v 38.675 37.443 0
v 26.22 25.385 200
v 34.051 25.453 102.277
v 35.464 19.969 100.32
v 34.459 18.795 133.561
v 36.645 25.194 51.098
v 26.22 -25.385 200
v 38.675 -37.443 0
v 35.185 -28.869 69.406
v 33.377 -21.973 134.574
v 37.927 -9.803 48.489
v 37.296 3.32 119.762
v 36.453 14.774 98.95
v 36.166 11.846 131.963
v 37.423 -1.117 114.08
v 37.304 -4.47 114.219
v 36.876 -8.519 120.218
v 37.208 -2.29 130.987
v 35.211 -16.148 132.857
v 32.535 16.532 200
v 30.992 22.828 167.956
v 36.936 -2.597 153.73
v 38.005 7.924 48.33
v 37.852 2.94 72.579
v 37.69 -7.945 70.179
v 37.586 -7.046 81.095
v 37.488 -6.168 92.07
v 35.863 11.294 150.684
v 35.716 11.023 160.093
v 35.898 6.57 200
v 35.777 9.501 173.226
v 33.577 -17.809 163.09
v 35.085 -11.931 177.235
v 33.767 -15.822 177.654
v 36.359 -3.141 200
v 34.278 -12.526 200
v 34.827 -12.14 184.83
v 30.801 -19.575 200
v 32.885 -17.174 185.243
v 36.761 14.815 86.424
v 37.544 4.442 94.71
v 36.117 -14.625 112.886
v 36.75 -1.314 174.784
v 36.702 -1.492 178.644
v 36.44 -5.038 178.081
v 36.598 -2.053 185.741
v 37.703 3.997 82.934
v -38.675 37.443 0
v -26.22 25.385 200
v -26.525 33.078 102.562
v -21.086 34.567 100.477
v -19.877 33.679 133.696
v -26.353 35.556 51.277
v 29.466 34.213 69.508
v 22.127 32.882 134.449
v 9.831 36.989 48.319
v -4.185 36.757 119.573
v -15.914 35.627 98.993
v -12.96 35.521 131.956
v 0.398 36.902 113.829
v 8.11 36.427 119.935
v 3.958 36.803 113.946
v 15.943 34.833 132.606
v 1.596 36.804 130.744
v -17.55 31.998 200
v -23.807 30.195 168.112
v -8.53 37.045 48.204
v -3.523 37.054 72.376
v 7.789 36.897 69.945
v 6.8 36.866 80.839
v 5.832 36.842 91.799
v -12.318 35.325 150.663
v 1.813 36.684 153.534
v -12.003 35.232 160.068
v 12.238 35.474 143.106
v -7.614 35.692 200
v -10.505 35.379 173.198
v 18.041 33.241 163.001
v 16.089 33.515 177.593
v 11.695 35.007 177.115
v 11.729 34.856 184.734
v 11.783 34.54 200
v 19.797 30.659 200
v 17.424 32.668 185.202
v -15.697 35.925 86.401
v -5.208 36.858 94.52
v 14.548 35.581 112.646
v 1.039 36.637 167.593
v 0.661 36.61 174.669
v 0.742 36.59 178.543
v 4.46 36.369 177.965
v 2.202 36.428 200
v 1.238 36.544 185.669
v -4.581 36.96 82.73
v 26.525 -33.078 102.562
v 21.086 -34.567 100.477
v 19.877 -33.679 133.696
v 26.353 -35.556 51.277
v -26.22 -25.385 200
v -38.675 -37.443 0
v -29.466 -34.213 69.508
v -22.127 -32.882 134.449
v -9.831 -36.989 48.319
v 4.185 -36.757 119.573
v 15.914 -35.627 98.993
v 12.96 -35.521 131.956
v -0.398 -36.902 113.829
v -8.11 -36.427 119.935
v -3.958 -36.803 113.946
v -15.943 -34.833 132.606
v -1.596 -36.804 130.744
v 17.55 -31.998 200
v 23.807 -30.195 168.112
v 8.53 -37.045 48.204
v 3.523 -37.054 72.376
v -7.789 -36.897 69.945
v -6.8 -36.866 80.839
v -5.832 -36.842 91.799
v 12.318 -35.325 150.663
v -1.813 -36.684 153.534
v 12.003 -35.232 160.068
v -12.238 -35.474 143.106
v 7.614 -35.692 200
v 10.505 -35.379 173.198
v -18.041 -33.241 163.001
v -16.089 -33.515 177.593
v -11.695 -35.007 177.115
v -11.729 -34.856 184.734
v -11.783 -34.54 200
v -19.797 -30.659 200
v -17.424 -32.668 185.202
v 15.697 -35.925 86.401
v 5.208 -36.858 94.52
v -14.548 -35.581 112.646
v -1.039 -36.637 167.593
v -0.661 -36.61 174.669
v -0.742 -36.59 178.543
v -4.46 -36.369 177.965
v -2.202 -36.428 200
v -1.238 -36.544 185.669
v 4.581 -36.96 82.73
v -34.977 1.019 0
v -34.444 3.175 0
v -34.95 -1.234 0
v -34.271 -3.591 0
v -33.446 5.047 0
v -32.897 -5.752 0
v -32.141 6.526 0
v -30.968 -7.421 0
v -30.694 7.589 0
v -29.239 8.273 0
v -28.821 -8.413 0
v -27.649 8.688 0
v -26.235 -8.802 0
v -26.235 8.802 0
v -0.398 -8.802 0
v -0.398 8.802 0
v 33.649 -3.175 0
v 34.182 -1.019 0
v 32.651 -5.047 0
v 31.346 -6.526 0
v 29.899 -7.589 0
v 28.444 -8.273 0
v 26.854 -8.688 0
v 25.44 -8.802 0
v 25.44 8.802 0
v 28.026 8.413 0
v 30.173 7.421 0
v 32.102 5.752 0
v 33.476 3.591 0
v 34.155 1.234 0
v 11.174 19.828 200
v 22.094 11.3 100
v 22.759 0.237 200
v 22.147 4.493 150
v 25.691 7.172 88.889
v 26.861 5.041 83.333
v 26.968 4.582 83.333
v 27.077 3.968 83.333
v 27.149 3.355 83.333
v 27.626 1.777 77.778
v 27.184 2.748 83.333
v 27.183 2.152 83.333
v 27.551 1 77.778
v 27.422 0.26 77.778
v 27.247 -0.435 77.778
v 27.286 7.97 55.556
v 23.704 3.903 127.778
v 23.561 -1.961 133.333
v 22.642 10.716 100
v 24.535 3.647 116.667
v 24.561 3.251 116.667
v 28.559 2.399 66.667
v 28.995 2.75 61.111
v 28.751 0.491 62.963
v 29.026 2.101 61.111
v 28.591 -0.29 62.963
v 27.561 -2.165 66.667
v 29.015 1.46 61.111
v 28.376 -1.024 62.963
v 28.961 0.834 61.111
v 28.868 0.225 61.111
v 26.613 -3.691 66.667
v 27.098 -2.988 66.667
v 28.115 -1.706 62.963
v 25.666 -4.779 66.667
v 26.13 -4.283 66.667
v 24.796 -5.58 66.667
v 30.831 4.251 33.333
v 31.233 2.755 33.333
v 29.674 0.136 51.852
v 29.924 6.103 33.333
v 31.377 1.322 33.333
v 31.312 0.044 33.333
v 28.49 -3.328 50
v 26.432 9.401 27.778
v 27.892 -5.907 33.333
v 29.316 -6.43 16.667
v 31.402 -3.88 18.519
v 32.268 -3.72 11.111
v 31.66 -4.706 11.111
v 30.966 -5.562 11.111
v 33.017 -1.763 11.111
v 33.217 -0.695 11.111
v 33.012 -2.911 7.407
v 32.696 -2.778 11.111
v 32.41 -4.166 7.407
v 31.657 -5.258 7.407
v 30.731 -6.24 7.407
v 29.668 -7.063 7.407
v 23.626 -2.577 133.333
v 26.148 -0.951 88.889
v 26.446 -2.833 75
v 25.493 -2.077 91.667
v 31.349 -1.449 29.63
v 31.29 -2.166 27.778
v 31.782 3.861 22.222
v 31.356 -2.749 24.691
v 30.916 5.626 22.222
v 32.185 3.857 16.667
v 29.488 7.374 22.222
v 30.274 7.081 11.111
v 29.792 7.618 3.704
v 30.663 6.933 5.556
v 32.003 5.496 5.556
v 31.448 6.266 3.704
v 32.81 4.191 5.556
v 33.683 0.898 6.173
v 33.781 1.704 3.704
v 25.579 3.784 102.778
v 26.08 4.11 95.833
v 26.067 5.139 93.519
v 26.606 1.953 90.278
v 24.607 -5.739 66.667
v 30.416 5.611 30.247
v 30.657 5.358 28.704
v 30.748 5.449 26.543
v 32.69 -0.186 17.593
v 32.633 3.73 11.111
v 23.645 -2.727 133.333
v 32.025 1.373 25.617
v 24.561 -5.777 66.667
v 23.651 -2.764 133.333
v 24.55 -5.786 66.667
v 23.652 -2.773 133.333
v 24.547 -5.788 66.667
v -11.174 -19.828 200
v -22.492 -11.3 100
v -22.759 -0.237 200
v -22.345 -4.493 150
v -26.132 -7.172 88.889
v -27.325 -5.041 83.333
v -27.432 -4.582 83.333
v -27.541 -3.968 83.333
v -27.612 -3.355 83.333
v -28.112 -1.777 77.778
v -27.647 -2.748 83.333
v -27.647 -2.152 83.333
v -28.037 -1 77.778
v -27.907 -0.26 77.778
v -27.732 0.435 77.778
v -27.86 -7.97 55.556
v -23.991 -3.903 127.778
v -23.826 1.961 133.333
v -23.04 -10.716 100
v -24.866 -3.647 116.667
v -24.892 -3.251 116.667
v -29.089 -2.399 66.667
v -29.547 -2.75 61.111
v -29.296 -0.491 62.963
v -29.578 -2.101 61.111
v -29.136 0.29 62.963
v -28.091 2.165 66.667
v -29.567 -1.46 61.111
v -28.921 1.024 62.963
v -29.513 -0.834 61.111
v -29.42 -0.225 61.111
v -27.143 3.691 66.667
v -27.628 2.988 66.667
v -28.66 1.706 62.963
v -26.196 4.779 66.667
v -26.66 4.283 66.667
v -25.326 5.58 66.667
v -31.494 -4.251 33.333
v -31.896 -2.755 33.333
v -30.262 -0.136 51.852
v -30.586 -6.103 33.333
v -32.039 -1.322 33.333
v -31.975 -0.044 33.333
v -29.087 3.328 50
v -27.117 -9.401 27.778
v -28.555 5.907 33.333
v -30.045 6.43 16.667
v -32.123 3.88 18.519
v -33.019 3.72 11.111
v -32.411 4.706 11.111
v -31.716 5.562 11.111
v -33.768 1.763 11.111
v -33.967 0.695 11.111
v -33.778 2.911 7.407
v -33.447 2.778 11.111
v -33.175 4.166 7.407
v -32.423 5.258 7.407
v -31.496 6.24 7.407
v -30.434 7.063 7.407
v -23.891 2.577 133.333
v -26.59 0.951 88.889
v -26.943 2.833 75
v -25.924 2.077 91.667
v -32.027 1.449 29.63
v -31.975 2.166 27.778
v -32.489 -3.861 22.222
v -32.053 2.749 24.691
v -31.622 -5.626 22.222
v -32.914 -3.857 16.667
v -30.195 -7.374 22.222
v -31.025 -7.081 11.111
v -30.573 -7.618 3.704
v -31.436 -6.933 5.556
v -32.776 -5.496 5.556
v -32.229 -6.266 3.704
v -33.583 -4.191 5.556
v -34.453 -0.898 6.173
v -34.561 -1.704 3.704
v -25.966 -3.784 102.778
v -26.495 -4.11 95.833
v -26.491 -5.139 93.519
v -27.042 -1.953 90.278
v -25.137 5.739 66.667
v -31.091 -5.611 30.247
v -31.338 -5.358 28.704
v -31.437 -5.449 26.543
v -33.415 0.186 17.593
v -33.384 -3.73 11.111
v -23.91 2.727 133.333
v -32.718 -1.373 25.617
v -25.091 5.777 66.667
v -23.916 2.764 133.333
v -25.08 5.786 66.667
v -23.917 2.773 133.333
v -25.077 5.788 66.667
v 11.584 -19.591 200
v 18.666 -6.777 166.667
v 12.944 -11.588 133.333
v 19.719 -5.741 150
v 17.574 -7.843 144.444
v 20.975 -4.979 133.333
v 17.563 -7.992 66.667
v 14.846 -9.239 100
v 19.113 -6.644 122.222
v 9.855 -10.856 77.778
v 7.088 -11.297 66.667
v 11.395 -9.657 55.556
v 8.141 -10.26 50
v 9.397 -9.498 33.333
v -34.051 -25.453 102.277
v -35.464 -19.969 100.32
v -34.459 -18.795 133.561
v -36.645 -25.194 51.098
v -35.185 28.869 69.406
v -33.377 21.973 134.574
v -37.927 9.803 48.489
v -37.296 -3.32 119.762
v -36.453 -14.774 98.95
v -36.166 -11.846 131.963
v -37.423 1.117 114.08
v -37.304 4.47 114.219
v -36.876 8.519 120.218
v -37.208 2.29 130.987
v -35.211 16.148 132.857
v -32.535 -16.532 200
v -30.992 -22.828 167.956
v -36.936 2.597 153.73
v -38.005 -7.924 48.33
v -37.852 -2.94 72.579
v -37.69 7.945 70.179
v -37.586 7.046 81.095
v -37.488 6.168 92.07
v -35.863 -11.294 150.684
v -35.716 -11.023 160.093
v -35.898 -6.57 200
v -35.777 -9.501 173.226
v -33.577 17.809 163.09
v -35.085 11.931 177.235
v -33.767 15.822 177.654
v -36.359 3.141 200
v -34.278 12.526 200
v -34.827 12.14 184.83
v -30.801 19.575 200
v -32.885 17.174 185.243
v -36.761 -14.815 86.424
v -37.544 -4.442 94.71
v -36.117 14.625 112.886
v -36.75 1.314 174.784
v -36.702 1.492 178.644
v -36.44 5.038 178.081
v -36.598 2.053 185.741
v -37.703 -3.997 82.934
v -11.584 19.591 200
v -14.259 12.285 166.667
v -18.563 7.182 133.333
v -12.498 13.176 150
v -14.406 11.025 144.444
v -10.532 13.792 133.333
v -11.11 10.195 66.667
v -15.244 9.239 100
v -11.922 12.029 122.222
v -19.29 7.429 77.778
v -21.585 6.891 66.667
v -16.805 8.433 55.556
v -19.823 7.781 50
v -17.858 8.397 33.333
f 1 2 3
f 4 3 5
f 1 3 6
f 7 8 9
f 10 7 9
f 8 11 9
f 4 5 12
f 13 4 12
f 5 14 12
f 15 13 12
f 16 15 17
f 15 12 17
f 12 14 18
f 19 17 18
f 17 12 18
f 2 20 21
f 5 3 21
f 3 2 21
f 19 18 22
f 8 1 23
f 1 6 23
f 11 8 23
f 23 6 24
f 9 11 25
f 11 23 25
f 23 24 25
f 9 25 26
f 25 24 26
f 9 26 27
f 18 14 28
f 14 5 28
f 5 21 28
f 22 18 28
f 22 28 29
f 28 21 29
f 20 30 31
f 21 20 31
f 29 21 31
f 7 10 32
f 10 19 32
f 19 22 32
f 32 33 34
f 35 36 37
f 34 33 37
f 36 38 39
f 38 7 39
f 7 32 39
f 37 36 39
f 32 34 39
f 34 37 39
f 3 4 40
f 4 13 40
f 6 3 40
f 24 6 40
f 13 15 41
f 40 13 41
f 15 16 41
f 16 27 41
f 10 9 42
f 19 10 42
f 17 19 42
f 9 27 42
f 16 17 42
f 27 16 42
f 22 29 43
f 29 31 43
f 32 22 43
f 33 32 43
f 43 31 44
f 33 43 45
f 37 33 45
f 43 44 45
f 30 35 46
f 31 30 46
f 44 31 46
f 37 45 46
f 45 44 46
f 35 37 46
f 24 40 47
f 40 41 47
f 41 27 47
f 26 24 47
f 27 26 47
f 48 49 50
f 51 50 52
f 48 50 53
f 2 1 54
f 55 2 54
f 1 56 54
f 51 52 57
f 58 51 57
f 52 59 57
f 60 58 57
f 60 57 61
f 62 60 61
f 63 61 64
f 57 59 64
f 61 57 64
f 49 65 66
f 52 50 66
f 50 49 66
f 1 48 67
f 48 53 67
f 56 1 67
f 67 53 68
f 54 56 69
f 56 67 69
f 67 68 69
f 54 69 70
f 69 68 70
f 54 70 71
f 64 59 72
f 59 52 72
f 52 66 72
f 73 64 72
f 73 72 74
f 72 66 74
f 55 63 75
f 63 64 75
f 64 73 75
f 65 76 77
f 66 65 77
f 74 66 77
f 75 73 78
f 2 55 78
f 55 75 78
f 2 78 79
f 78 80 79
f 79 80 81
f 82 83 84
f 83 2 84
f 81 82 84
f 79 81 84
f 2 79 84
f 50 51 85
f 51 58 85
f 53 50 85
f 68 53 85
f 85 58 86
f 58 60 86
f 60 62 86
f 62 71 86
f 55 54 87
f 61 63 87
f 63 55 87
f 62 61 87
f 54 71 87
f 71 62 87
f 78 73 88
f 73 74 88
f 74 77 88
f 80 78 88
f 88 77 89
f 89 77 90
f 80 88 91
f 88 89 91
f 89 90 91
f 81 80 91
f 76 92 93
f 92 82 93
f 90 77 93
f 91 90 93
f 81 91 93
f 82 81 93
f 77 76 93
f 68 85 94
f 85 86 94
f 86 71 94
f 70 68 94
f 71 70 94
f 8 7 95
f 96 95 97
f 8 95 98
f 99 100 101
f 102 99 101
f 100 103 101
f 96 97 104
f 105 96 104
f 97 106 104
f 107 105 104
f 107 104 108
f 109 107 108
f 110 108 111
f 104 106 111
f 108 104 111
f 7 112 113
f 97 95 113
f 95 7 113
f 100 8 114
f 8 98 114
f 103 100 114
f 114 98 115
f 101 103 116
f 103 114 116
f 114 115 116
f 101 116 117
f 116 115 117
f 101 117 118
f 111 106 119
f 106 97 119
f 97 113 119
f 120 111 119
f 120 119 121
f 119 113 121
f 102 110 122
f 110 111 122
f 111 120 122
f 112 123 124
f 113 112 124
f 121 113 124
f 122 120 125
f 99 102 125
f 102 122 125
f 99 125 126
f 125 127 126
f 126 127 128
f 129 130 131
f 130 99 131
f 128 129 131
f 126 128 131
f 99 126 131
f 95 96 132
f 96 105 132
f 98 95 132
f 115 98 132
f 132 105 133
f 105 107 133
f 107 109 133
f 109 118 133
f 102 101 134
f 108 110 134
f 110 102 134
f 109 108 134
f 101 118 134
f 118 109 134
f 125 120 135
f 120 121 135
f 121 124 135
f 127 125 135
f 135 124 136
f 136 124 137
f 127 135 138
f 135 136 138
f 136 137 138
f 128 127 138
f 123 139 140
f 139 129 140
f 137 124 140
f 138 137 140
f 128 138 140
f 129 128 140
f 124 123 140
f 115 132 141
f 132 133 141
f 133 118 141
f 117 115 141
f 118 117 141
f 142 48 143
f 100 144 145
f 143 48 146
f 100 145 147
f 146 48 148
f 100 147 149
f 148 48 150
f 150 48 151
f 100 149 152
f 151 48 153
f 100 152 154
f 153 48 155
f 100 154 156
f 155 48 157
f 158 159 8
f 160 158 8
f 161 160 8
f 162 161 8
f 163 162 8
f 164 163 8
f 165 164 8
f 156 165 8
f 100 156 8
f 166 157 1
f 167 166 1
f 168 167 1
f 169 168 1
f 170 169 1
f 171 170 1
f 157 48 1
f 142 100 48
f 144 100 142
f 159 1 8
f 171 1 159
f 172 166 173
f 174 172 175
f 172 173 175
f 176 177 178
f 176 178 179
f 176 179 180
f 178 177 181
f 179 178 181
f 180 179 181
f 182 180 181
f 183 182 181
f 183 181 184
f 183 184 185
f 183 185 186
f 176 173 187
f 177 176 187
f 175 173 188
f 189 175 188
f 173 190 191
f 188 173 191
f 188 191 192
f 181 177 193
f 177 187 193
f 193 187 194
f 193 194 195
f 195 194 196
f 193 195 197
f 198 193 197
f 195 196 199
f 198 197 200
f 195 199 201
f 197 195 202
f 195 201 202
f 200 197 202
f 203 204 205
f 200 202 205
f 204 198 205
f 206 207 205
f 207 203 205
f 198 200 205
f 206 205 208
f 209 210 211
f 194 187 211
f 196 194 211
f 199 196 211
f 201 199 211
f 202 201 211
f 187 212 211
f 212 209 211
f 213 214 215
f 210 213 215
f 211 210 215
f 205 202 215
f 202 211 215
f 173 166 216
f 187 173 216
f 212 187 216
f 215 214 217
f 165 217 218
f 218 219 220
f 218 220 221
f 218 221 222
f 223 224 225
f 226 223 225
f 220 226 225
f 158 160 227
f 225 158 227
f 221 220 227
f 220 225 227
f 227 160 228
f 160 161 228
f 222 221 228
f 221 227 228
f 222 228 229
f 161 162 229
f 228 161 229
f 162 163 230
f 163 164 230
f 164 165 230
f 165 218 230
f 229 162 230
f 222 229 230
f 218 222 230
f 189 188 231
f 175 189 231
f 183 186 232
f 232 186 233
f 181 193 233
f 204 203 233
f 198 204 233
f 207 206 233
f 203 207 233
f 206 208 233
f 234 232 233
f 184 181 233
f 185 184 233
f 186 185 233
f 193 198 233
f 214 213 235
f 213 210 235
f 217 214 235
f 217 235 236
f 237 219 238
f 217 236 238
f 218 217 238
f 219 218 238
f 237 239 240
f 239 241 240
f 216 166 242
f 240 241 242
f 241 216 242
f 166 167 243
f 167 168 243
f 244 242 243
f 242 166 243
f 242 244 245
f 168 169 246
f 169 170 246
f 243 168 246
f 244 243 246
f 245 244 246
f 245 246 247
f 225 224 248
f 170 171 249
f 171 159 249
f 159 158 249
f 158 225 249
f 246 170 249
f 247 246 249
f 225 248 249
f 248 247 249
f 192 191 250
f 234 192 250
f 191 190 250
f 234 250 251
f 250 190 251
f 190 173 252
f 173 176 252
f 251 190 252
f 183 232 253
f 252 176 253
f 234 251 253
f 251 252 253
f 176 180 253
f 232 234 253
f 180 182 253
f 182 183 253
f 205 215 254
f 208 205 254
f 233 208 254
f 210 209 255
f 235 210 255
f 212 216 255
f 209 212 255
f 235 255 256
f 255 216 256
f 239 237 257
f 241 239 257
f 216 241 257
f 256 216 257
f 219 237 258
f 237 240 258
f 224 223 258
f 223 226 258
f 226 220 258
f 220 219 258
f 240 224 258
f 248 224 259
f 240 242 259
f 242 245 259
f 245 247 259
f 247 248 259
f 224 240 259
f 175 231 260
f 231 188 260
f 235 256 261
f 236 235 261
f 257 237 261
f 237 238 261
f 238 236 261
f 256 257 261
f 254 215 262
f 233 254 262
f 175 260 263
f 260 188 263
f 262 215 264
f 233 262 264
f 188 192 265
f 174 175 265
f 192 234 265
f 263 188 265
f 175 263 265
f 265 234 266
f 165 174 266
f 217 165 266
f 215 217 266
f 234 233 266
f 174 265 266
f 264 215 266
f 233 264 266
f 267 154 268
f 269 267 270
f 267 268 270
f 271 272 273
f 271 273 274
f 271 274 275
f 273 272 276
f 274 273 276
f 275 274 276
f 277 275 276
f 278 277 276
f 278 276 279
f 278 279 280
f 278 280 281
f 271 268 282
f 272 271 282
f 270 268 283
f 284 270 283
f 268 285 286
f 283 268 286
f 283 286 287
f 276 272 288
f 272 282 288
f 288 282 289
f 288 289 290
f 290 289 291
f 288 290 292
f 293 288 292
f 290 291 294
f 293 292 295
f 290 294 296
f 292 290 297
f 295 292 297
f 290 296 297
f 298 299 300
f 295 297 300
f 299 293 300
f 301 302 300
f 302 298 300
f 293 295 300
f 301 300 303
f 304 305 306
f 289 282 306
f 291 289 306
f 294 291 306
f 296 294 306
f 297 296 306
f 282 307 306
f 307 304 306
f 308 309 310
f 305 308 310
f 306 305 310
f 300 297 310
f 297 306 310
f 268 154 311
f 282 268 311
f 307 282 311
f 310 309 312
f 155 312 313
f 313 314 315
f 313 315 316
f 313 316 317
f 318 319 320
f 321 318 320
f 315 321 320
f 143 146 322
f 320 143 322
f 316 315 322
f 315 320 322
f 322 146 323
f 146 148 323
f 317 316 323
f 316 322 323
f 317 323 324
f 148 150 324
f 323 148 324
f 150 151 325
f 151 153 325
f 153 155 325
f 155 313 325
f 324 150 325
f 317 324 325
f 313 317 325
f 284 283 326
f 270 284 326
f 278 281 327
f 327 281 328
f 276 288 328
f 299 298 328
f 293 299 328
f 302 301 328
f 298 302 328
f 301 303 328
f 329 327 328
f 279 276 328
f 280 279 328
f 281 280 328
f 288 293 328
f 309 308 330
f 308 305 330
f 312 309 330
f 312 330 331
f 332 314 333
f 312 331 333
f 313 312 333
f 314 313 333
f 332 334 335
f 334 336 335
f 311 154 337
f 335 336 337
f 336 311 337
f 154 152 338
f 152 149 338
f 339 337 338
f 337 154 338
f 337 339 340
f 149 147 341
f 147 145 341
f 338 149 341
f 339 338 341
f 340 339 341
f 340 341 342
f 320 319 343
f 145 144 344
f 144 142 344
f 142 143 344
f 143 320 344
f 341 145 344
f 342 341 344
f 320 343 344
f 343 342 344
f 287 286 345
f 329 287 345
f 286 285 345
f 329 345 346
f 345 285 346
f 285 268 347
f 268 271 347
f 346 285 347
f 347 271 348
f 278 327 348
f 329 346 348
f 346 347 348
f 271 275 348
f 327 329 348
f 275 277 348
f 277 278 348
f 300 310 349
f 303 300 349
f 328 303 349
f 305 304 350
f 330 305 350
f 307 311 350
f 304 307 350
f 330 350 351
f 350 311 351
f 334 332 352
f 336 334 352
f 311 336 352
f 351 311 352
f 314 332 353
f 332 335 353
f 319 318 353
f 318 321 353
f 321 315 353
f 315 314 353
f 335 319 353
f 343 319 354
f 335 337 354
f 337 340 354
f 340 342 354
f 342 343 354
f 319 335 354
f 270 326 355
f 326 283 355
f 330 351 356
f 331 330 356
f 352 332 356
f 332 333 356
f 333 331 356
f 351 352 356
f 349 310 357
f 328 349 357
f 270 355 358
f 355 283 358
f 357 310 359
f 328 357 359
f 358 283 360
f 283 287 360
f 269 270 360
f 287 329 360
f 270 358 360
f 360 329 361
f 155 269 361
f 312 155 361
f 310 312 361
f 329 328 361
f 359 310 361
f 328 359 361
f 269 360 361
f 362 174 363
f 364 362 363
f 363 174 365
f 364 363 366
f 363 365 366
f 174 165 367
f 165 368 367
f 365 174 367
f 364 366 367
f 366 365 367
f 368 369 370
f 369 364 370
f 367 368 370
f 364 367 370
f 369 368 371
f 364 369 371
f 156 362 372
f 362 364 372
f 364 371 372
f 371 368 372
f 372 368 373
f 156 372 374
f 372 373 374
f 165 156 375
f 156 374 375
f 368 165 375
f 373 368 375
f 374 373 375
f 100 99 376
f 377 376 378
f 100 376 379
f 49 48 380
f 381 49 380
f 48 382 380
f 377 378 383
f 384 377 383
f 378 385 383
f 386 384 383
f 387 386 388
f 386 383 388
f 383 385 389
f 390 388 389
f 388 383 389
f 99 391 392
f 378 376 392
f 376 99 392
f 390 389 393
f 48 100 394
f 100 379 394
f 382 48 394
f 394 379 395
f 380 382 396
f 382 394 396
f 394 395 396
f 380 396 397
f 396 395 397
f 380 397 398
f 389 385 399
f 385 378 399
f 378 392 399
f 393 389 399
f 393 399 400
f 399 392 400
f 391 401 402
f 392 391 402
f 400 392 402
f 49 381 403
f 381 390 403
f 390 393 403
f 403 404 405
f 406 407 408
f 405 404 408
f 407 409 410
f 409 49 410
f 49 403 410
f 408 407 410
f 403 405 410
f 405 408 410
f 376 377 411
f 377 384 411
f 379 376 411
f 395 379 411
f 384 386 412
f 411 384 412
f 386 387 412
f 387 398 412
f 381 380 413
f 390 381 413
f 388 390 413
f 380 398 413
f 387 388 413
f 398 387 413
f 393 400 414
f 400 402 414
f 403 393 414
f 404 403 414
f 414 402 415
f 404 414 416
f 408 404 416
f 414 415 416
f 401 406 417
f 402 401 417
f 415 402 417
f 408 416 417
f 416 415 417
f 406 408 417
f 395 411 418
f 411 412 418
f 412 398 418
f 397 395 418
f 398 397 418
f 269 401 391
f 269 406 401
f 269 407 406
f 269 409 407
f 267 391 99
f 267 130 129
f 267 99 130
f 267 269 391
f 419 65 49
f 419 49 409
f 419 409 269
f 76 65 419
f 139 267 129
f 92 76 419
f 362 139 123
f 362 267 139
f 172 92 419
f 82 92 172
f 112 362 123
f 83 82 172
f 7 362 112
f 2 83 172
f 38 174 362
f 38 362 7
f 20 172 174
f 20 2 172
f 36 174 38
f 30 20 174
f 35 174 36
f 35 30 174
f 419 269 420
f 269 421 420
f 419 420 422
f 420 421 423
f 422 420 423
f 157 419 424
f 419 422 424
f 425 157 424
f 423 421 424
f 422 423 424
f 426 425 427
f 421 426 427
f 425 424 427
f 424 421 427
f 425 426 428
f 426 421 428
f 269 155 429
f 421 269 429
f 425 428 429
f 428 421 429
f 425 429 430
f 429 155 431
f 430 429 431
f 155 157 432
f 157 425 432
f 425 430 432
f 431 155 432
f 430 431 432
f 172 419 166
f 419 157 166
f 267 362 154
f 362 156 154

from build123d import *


with BuildPart() as part:
    # Esquisse2 → Lissage1 section 0
    with BuildSketch(Plane.XY):
        with BuildLine():
            Line((-38.674883287, 37.442595339), (38.674883287, 37.442595339))
            Line((38.674883287, 37.442595339), (38.674883287, -37.442595339))
            Line((38.674883287, -37.442595339), (-38.674883287, -37.442595339))
            Line((-38.674883287, -37.442595339), (-38.674883287, 37.442595339))
        make_face()
    # Esquisse1 for Lissage1 → Lissage1 section 1
    with BuildSketch(Plane.XY.offset(200)):
        with BuildLine():
            # circular arc as an exact rational Bezier (weights 1, cos(half-angle), 1)
            Bezier((-26.219975918, 25.384535509), (0, 52.467447345), (26.219975918, 25.384535509), weights=[1, 0.695568078, 1])
            Bezier((26.219975918, 25.384535509), (50.795690445, 0), (26.219975918, -25.384535509), weights=[1, 0.718460192, 1])
            Bezier((26.219975918, -25.384535509), (0, -52.467447345), (-26.219975918, -25.384535509), weights=[1, 0.695568078, 1])
            Bezier((-26.219975918, -25.384535509), (-50.795690445, 0), (-26.219975918, 25.384535509), weights=[1, 0.718460192, 1])
        make_face()
    loft()

    # Enlèvement de matière-Lissage1: read off the stored shape, not the designer's step
    # Enlèvement de matière-Lissage1: loft between two sections, ruled curve by curve
    enl_vement_de_mati_re_lissage1_from = [
        Edge.make_bspline([(-22.758559894, -0.236750535, 200), (-20.896185232, 3.067893847, 200), (-19.033810571, 6.372538228, 200), (-15.309061247, 12.981826991, 200), (-13.446686586, 16.286471373, 200), (-11.584311924, 19.591115754, 200)], [0, 0, 0, 0, 0.5, 0.5, 1, 1, 1, 1], 3),
        Edge.make_bspline([(-11.584311924, 19.591115754, 200), (-7.791218609, 19.630574177, 200), (-3.998125293, 19.670032599, 200), (3.588061338, 19.748949444, 200), (7.381154654, 19.788407866, 200), (11.174247969, 19.827866289, 200)], [0, 0, 0, 0, 0.5, 0.5, 1, 1, 1, 1], 3),
        Edge.make_bspline([(-11.174247969, -19.827866289, 200), (-11.415587801, -19.419718044, 200), (-11.656927633, -19.011569799, 200), (-12.139607297, -18.195273309, 200), (-12.380947128, -17.787125064, 200), (-12.863626792, -16.970828575, 200), (-13.104966624, -16.56268033, 200), (-13.587646287, -15.74638384, 200), (-13.828986119, -15.338235595, 200), (-14.311665782, -14.521939105, 200), (-14.553005614, -14.113790861, 200), (-15.035685278, -13.297494371, 200), (-15.277025109, -12.889346126, 200), (-15.759704773, -12.073049636, 200), (-16.001044605, -11.664901391, 200), (-16.483724268, -10.848604901, 200), (-16.7250641, -10.440456657, 200), (-17.207743763, -9.624160167, 200), (-17.449083595, -9.216011922, 200), (-17.931763259, -8.399715432, 200), (-18.17310309, -7.991567187, 200), (-18.655782754, -7.175270698, 200), (-18.897122586, -6.767122453, 200), (-19.379802249, -5.950825963, 200), (-19.621142081, -5.542677718, 200), (-20.103821744, -4.726381228, 200), (-20.345161576, -4.318232983, 200), (-20.82784124, -3.501936494, 200), (-21.069181071, -3.093788249, 200), (-21.551860735, -2.277491759, 200), (-21.793200567, -1.869343514, 200), (-22.27588023, -1.053047024, 200), (-22.517220062, -0.64489878, 200), (-22.758559894, -0.236750535, 200)], [0, 0, 0, 0, 0.0625, 0.0625, 0.125, 0.125, 0.1875, 0.1875, 0.25, 0.25, 0.3125, 0.3125, 0.375, 0.375, 0.4375, 0.4375, 0.5, 0.5, 0.5625, 0.5625, 0.625, 0.625, 0.6875, 0.6875, 0.75, 0.75, 0.8125, 0.8125, 0.875, 0.875, 0.9375, 0.9375, 1, 1, 1, 1], 3),
        Edge.make_bspline([(11.174247969, 19.827866289, 200), (11.415587801, 19.419718044, 200), (11.656927633, 19.011569799, 200), (12.139607297, 18.195273309, 200), (12.380947128, 17.787125064, 200), (12.863626792, 16.970828575, 200), (13.104966624, 16.56268033, 200), (13.587646287, 15.74638384, 200), (13.828986119, 15.338235595, 200), (14.311665782, 14.521939105, 200), (14.553005614, 14.113790861, 200), (15.035685278, 13.297494371, 200), (15.277025109, 12.889346126, 200), (15.759704773, 12.073049636, 200), (16.001044605, 11.664901391, 200), (16.483724268, 10.848604901, 200), (16.7250641, 10.440456657, 200), (17.207743763, 9.624160167, 200), (17.449083595, 9.216011922, 200), (17.931763259, 8.399715432, 200), (18.17310309, 7.991567187, 200), (18.655782754, 7.175270698, 200), (18.897122586, 6.767122453, 200), (19.379802249, 5.950825963, 200), (19.621142081, 5.542677718, 200), (20.103821744, 4.726381228, 200), (20.345161576, 4.318232983, 200), (20.82784124, 3.501936494, 200), (21.069181071, 3.093788249, 200), (21.551860735, 2.277491759, 200), (21.793200567, 1.869343514, 200), (22.27588023, 1.053047024, 200), (22.517220062, 0.64489878, 200), (22.758559894, 0.236750535, 200)], [0, 0, 0, 0, 0.0625, 0.0625, 0.125, 0.125, 0.1875, 0.1875, 0.25, 0.25, 0.3125, 0.3125, 0.375, 0.375, 0.4375, 0.4375, 0.5, 0.5, 0.5625, 0.5625, 0.625, 0.625, 0.6875, 0.6875, 0.75, 0.75, 0.8125, 0.8125, 0.875, 0.875, 0.9375, 0.9375, 1, 1, 1, 1], 3),
        Edge.make_bspline([(22.758559894, 0.236750535, 200), (20.896185232, -3.067893847, 200), (19.033810571, -6.372538228, 200), (15.309061247, -12.981826991, 200), (13.446686586, -16.286471373, 200), (11.584311924, -19.591115754, 200)], [0, 0, 0, 0, 0.5, 0.5, 1, 1, 1, 1], 3),
        Edge.make_bspline([(11.584311924, -19.591115754, 200), (7.791218609, -19.630574177, 200), (3.998125293, -19.670032599, 200), (-3.588061338, -19.748949444, 200), (-7.381154654, -19.788407866, 200), (-11.174247969, -19.827866289, 200)], [0, 0, 0, 0, 0.5, 0.5, 1, 1, 1, 1], 3),
    ]
    enl_vement_de_mati_re_lissage1_to = [
        Edge.make_bspline([(-26.235059358, 8.801805629, 0), (-21.928799615, 8.801805629, 0), (-17.622539872, 8.801805629, 0), (-9.010020385, 8.801805629, 0), (-4.703760642, 8.801805629, 0), (-0.397500899, 8.801805629, 0)], [0, 0, 0, 0, 0.5, 0.5, 1, 1, 1, 1], 3),
        Edge.make_bspline([(-0.397500899, 8.801805629, 0), (3.908758844, 8.801805629, 0), (8.215018587, 8.801805629, 0), (16.827538073, 8.801805629, 0), (21.133797816, 8.801805629, 0), (25.440057559, 8.801805629, 0)], [0, 0, 0, 0, 0.5, 0.5, 1, 1, 1, 1], 3),
        Edge.make_bspline([(-26.235059358, -8.801805629, 0), (-26.601801259, -8.801805629, 0), (-26.991692504, -8.779058383, 0), (-27.815188768, -8.668768704, 0), (-28.248912486, -8.581173701, 0), (-29.150217382, -8.318293106, 0), (-29.617918879, -8.142864745, 0), (-30.566141848, -7.680606048, 0), (-31.046713101, -7.393516728, 0), (-31.985572368, -6.689372278, 0), (-32.44372653, -6.271981593, 0), (-33.289386969, -5.302995672, 0), (-33.676493644, -4.751147675, 0), (-34.32622324, -3.532904681, 0), (-34.588268029, -2.866576224, 0), (-34.943812367, -1.466620394, 0), (-35.036864986, -0.733483802, 0), (-35.036864986, 0.733483802, 0), (-34.943812367, 1.466620394, 0), (-34.588268029, 2.866576224, 0), (-34.32622324, 3.532904681, 0), (-33.676493644, 4.751147675, 0), (-33.289386969, 5.302995672, 0), (-32.44372653, 6.271981593, 0), (-31.985572368, 6.689372278, 0), (-31.046713101, 7.393516728, 0), (-30.566141848, 7.680606048, 0), (-29.617918879, 8.142864745, 0), (-29.150217382, 8.318293106, 0), (-28.248912486, 8.581173701, 0), (-27.815188768, 8.668768704, 0), (-26.991692504, 8.779058383, 0), (-26.601801259, 8.801805629, 0), (-26.235059358, 8.801805629, 0)], [0, 0, 0, 0, 0.0625, 0.0625, 0.125, 0.125, 0.1875, 0.1875, 0.25, 0.25, 0.3125, 0.3125, 0.375, 0.375, 0.4375, 0.4375, 0.5, 0.5, 0.5625, 0.5625, 0.625, 0.625, 0.6875, 0.6875, 0.75, 0.75, 0.8125, 0.8125, 0.875, 0.875, 0.9375, 0.9375, 1, 1, 1, 1], 3),
        Edge.make_bspline([(25.440057559, 8.801805629, 0), (25.80679946, 8.801805629, 0), (26.196690705, 8.779058383, 0), (27.020186969, 8.668768704, 0), (27.453910687, 8.581173701, 0), (28.355215583, 8.318293106, 0), (28.82291708, 8.142864745, 0), (29.771140049, 7.680606048, 0), (30.251711303, 7.393516728, 0), (31.19057057, 6.689372278, 0), (31.648724731, 6.271981593, 0), (32.49438517, 5.302995672, 0), (32.881491845, 4.751147675, 0), (33.531221441, 3.532904681, 0), (33.79326623, 2.866576224, 0), (34.148810568, 1.466620394, 0), (34.241863188, 0.733483802, 0), (34.241863188, -0.733483802, 0), (34.148810568, -1.466620394, 0), (33.79326623, -2.866576224, 0), (33.531221441, -3.532904681, 0), (32.881491845, -4.751147675, 0), (32.49438517, -5.302995672, 0), (31.648724731, -6.271981593, 0), (31.19057057, -6.689372278, 0), (30.251711303, -7.393516728, 0), (29.771140049, -7.680606048, 0), (28.82291708, -8.142864745, 0), (28.355215583, -8.318293106, 0), (27.453910687, -8.581173701, 0), (27.020186969, -8.668768704, 0), (26.196690705, -8.779058383, 0), (25.80679946, -8.801805629, 0), (25.440057559, -8.801805629, 0)], [0, 0, 0, 0, 0.0625, 0.0625, 0.125, 0.125, 0.1875, 0.1875, 0.25, 0.25, 0.3125, 0.3125, 0.375, 0.375, 0.4375, 0.4375, 0.5, 0.5, 0.5625, 0.5625, 0.625, 0.625, 0.6875, 0.6875, 0.75, 0.75, 0.8125, 0.8125, 0.875, 0.875, 0.9375, 0.9375, 1, 1, 1, 1], 3),
        Edge.make_bspline([(25.440057559, -8.801805629, 0), (21.133797816, -8.801805629, 0), (16.827538073, -8.801805629, 0), (8.215018587, -8.801805629, 0), (3.908758844, -8.801805629, 0), (-0.397500899, -8.801805629, 0)], [0, 0, 0, 0, 0.5, 0.5, 1, 1, 1, 1], 3),
        Edge.make_bspline([(-0.397500899, -8.801805629, 0), (-4.703760642, -8.801805629, 0), (-9.010020385, -8.801805629, 0), (-17.622539872, -8.801805629, 0), (-21.928799615, -8.801805629, 0), (-26.235059358, -8.801805629, 0)], [0, 0, 0, 0, 0.5, 0.5, 1, 1, 1, 1], 3),
    ]
    enl_vement_de_mati_re_lissage1 = Solid(Shell([*[Face.make_surface_from_curves(enl_vement_de_mati_re_lissage1_from[k], enl_vement_de_mati_re_lissage1_to[k]) for k in range(6)], Face(Wire(enl_vement_de_mati_re_lissage1_from)), Face(Wire(enl_vement_de_mati_re_lissage1_to))]))
    add(enl_vement_de_mati_re_lissage1, mode=Mode.SUBTRACT)


solid = part.part
